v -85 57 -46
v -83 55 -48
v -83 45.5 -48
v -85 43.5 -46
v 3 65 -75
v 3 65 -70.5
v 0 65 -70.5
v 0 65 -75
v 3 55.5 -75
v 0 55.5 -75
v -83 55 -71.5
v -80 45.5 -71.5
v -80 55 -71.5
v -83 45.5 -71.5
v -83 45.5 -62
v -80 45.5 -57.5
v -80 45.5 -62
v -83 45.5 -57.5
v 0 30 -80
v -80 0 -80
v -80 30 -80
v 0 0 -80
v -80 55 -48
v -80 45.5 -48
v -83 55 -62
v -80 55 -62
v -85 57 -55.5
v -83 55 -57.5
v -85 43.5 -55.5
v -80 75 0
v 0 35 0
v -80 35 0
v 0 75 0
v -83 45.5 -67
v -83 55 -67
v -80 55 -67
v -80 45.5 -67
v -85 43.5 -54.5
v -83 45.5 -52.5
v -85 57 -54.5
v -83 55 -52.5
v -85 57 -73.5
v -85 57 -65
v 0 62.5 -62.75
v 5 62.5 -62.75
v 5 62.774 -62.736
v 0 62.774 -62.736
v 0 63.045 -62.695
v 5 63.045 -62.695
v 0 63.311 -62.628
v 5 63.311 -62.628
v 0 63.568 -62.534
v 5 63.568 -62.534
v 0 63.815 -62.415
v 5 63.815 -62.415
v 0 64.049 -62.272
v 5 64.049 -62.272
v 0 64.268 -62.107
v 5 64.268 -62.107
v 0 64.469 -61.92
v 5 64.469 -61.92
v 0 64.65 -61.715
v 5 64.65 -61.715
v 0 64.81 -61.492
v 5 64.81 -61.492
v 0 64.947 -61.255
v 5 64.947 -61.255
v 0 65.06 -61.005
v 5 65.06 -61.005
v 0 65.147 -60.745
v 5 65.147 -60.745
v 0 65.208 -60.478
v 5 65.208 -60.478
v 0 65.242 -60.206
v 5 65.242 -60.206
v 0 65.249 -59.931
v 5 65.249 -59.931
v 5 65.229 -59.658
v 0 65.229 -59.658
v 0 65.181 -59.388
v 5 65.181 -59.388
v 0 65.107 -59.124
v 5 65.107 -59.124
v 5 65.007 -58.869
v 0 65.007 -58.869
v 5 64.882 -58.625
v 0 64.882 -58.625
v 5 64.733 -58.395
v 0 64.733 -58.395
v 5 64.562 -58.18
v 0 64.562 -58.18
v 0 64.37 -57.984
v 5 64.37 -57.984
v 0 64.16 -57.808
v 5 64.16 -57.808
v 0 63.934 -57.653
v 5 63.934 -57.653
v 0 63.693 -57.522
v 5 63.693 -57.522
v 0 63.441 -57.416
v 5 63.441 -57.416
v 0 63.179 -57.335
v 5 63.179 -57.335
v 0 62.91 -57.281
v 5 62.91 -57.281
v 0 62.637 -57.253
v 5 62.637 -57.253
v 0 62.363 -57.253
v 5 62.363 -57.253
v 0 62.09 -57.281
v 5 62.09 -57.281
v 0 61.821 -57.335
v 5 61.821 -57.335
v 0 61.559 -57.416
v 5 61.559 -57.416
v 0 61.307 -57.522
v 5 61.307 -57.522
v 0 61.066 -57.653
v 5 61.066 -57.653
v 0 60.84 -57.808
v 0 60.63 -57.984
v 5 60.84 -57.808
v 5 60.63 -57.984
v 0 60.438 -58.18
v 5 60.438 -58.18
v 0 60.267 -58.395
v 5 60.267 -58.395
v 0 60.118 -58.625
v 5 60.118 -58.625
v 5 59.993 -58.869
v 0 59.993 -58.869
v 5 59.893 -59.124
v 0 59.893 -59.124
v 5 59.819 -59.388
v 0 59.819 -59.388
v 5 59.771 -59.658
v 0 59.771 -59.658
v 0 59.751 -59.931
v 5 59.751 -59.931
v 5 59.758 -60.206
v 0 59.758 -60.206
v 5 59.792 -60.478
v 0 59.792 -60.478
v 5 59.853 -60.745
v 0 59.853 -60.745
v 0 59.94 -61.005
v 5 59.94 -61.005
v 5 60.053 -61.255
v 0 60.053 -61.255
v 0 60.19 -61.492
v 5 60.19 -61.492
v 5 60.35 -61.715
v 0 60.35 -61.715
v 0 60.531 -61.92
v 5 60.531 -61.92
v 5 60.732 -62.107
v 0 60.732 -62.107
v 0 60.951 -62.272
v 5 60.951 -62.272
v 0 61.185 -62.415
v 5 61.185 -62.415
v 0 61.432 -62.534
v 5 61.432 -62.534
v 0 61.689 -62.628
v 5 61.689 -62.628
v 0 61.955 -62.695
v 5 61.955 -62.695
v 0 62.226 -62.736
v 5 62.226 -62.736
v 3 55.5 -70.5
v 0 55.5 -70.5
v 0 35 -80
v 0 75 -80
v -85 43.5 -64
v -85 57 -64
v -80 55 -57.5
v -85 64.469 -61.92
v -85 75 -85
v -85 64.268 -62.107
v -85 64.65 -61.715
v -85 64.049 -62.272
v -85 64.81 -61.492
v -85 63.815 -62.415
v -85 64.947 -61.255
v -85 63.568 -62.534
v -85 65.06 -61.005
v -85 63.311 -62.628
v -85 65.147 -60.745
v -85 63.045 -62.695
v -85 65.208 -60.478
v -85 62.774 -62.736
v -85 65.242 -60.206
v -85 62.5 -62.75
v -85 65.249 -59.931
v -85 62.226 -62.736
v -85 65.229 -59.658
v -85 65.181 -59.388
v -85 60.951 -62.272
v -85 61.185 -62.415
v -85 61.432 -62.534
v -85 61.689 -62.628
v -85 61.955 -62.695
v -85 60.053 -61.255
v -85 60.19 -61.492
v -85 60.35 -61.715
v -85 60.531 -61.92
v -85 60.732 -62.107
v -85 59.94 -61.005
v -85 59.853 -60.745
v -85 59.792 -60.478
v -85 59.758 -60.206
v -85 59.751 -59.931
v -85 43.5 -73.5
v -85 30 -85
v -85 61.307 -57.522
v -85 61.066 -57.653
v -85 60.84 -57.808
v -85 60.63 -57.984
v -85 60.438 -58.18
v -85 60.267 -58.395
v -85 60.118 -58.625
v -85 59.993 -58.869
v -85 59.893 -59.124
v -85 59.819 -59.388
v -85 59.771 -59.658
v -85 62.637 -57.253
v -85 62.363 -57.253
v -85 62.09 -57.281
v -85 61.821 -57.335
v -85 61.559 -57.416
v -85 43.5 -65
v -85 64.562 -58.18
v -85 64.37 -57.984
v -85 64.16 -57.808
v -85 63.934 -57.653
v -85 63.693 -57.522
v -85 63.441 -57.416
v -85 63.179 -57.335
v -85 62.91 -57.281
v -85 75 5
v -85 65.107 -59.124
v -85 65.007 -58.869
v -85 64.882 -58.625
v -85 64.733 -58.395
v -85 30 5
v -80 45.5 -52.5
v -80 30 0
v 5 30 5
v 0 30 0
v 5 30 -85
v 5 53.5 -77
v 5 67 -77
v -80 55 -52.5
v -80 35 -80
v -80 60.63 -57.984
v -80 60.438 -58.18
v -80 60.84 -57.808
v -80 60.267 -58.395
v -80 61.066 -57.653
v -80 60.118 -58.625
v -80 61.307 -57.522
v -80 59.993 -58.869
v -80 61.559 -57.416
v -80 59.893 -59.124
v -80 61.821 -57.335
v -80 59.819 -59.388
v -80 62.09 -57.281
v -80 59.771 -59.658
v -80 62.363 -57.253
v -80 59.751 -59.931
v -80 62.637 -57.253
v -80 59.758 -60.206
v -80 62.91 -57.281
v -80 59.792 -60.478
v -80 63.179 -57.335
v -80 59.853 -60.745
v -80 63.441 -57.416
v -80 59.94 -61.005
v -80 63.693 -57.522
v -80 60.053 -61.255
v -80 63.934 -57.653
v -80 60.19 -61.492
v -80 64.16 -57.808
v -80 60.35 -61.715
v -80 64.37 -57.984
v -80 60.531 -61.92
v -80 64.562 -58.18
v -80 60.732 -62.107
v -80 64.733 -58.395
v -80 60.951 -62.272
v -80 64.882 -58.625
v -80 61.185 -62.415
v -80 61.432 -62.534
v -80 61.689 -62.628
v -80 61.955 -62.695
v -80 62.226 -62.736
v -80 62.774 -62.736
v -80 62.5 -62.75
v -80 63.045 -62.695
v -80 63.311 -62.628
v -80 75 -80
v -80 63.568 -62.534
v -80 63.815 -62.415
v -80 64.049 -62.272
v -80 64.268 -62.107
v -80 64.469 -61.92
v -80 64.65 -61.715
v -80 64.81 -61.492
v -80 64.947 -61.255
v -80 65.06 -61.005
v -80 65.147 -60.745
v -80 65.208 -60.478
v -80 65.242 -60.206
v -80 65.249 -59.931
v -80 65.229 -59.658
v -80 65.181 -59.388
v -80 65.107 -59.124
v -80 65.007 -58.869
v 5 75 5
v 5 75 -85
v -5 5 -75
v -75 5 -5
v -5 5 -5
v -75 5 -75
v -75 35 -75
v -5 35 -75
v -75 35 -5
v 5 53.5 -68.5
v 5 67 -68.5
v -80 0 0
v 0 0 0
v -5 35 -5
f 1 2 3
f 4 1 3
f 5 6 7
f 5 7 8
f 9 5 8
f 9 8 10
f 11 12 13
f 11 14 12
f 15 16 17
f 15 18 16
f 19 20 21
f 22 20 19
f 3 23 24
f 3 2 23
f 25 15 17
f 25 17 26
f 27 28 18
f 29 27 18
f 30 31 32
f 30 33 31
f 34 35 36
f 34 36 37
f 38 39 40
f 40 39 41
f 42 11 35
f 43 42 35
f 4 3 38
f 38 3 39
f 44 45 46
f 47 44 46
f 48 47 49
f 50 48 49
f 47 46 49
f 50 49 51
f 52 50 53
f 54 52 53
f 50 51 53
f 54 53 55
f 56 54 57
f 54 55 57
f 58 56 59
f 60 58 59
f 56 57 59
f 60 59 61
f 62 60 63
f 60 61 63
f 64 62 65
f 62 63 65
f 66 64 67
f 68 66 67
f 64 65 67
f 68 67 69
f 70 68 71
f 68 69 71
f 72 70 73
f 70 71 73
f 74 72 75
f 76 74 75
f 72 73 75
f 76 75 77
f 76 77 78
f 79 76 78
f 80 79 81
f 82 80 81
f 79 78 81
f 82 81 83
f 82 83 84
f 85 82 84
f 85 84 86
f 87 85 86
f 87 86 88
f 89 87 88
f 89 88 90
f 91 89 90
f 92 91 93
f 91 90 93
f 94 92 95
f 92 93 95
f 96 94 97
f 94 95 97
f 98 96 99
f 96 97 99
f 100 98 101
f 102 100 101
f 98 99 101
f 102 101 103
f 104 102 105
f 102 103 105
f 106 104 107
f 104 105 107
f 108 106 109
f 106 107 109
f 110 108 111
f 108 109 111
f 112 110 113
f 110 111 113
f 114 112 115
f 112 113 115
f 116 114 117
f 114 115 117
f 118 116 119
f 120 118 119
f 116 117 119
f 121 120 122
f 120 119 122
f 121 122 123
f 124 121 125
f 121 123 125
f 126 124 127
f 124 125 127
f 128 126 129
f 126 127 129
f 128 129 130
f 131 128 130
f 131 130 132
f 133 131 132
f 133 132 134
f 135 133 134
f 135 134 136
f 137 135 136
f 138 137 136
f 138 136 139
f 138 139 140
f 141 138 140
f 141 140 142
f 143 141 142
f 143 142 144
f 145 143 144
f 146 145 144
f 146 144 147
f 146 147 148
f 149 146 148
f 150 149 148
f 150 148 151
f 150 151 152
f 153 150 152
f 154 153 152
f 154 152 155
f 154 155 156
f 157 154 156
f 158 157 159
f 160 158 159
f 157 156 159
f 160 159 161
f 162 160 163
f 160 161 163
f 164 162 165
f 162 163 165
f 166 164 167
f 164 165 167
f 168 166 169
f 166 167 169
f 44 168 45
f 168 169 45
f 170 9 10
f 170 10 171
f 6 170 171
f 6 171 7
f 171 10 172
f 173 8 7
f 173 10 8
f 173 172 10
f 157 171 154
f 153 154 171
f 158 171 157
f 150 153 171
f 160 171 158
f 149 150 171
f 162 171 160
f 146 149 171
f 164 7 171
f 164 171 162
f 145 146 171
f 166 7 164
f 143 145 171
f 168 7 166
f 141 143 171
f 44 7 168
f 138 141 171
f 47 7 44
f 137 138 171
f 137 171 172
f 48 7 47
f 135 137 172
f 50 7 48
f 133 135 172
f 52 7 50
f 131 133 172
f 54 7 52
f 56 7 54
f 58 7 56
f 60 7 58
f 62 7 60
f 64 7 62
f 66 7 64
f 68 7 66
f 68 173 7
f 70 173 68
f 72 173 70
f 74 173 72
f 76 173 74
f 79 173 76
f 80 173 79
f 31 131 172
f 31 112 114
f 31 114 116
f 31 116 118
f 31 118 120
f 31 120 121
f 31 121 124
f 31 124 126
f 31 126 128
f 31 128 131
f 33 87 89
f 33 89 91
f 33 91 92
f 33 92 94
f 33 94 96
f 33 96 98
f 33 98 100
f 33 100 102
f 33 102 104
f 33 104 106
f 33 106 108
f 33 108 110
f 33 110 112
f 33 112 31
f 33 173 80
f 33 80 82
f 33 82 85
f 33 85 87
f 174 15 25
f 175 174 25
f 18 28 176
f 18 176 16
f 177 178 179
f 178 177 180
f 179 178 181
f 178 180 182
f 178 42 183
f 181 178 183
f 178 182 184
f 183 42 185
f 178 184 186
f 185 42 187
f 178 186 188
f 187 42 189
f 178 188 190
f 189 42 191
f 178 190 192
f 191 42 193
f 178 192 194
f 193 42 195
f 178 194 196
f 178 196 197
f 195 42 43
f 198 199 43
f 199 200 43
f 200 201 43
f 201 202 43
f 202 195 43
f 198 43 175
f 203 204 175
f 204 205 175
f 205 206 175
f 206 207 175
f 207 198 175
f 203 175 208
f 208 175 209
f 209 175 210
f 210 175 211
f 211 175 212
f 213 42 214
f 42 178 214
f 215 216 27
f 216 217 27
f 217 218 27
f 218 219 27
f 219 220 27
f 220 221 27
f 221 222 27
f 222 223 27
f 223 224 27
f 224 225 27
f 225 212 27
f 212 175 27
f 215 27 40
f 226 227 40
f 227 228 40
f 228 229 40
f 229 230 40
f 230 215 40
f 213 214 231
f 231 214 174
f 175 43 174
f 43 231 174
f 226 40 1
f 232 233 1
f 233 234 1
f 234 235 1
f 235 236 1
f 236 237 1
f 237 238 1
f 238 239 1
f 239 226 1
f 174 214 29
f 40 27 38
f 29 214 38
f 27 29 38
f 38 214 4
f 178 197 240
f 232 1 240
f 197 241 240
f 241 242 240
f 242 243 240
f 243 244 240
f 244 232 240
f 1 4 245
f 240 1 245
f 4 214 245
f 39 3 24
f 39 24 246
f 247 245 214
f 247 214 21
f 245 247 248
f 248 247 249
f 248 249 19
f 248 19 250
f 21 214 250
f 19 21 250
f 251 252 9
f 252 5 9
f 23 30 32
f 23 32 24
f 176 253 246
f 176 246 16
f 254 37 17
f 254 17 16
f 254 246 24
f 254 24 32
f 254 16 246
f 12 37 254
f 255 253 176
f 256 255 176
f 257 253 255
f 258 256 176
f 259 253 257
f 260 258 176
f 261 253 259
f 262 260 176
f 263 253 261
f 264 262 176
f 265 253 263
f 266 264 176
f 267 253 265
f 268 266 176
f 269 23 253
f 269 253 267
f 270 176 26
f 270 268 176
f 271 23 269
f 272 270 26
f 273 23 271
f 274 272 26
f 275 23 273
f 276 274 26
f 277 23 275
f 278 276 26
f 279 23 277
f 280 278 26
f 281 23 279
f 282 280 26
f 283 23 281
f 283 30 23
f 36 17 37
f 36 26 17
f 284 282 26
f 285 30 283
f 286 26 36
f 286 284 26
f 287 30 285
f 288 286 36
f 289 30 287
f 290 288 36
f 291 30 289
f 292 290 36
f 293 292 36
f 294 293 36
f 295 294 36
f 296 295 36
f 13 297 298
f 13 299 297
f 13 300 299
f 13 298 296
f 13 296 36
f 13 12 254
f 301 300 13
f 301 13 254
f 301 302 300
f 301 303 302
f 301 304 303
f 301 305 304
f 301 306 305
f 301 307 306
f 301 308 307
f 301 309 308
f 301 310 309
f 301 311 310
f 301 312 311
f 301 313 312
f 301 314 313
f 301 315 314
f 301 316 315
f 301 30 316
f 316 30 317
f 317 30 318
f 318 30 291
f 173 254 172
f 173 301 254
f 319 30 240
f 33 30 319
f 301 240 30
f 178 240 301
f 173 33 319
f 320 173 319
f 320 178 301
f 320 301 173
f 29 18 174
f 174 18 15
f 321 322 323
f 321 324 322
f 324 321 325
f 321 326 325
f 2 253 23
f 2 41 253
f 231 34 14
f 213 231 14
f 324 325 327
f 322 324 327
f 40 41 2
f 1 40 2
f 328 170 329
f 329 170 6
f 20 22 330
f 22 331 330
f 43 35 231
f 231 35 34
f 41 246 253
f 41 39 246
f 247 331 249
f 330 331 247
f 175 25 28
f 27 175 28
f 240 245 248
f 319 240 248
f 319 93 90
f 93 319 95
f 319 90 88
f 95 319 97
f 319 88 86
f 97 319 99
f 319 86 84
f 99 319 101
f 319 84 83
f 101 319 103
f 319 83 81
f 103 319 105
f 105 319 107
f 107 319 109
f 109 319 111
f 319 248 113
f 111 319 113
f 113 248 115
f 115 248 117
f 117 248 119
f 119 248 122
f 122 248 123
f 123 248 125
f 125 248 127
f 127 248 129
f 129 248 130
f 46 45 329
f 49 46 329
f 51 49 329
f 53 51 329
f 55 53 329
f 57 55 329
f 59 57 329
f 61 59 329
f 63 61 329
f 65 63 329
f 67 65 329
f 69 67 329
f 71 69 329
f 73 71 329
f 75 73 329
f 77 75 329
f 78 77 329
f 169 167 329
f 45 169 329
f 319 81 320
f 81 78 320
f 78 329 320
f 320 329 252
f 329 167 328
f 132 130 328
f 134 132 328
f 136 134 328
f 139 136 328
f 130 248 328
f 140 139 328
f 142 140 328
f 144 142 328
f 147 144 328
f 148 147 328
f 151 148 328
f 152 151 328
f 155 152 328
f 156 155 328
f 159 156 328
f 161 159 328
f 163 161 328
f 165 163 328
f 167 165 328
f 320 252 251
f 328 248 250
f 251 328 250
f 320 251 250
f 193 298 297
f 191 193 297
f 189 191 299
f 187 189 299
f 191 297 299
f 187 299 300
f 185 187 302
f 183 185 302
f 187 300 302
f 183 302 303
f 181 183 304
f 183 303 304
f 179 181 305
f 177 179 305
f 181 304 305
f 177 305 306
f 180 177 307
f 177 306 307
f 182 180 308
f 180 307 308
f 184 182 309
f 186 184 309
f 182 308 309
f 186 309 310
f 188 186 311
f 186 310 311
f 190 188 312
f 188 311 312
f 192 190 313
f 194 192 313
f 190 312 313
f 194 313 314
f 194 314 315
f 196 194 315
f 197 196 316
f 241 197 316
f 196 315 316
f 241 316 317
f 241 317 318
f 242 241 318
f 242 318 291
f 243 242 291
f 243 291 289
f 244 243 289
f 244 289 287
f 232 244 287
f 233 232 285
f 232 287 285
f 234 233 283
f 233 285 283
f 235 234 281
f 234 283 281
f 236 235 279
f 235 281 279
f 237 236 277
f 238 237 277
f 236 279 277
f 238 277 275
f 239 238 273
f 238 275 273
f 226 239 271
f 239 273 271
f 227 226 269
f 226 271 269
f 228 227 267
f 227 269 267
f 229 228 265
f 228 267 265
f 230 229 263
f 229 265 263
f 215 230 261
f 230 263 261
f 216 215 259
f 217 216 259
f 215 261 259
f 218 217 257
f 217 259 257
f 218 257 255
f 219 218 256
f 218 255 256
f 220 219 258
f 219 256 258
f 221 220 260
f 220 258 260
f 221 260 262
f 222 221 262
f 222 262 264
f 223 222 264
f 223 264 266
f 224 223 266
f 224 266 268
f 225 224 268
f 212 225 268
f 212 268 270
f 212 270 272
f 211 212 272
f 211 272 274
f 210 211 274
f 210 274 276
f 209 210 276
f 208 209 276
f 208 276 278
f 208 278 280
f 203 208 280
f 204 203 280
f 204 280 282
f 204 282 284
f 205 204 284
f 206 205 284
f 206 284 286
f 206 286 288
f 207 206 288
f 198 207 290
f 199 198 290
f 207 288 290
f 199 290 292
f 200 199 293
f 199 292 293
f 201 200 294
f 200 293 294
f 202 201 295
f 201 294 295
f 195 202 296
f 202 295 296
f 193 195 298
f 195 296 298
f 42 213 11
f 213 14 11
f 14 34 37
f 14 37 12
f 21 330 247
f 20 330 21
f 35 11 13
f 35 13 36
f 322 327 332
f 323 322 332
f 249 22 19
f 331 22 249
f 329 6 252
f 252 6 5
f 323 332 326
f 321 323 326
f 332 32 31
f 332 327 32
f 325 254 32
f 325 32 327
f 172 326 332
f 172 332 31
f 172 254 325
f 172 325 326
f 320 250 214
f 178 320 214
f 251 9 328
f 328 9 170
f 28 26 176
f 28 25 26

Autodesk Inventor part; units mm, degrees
ref_plane "YZ Plane" through (0, 0, 0) normal (1, 0, 0) x (0, 1, 0)
ref_plane "XZ Plane" through (0, 0, 0) normal (0, 1, 0) x (-1, 0, 0)
ref_plane "XY Plane" through (0, 0, 0) normal (0, 0, 1) x (1, 0, 0)
sketch "Sketch1" plane through (0, 0, 0) normal (0, 1, 0) x (-1, 0, 0)
  line L0 (0, 0) -> (80, 0)
  line L1 (80, 0) -> (80, -80)
  line L2 (80, -80) -> (0, -80)
  line L3 (0, -80) -> (0, 0)
  dimension "d0" = 80
  dimension "d1" = 80
extrude "Extrusion1" add sketch "Sketch1" along normal blind 30
sketch "Sketch2" plane through (0, 30, 0) normal (0, 1, 0) x (1, 0, 0)
  line L0 (-85, -5) -> (5, -5)
  line L1 (5, -5) -> (5, 85)
  line L2 (5, 85) -> (-85, 85)
  line L3 (-85, 85) -> (-85, -5)
  line L4 (-80, 80) -> (-80, 0) projected
  line L5 (0, 80) -> (-80, 80) projected
  line L6 (-80, 0) -> (0, 0) projected
  line L7 (0, 0) -> (0, 80) projected
  dimension "d4" = 5
  dimension "d5" = 5
  dimension "d6" = 5
  dimension "d7" = 5
extrude "Extrusion2" add sketch "Sketch2" along normal blind 45 contours L3 L2 L1 L0 | L5 L7 L6 L4
sketch "Sketch3" plane through (0, 75, 0) normal (0, 1, 0) x (1, 0, 0)
  line L0 (0, 0) -> (-80, 0)
  line L1 (-80, 0) -> (-80, 80)
  line L2 (-80, 80) -> (0, 80)
  line L3 (0, 80) -> (0, 0)
  line L4 (-85, 85) -> (-85, -5) projected
  line L5 (5, 85) -> (-85, 85) projected
  dimension "d10" = 5
  dimension "d11" = 5
extrude "Extrusion3" cut sketch "Sketch3" against normal blind 40
sketch "Sketch4" plane through (0, 35, 0) normal (0, 1, 0) x (1, 0, 0)
  line L0 (-75, 5) -> (-5, 5)
  line L1 (-5, 5) -> (-5, 75)
  line L2 (-5, 75) -> (-75, 75)
  line L3 (-75, 75) -> (-75, 5)
  line L4 (-80, 80) -> (0, 80) projected
  line L5 (0, 80) -> (0, 0) projected
  line L6 (0, 0) -> (-80, 0) projected
  line L7 (-80, 0) -> (-80, 80) projected
  dimension "d14" = 5
  dimension "d15" = 5
  dimension "d16" = 5
  dimension "d17" = 5
extrude "Extrusion4" cut sketch "Sketch4" against normal blind 30 contours L3 L2 L1 L0
sketch "Sketch5" plane through (5, 30, 5) normal (1, 0, 0) x (0, 0, -1)
  circle A0 centre (65, 32.5) radius 2.75
  line L0 (0, 45) -> (90, 45) projected
  line L1 (90, 0) -> (90, 45) projected
  point P0 (5, -30)
  dimension "d20" = 5.5
  dimension "d21" = 12.5
  dimension "d22" = 25
extrude "Extrusion5" cut sketch "Sketch5" against normal through all
sketch "Sketch6" plane through (5, 30, 5) normal (1, 0, 0) x (0, 0, -1)
  line L0 (75.5, 35) -> (80, 35)
  line L1 (80, 35) -> (80, 25.5)
  line L2 (80, 25.5) -> (75.5, 25.5)
  line L3 (75.5, 25.5) -> (75.5, 35)
  line L4 (90, 0) -> (90, 45) projected
  line L5 (0, 45) -> (90, 45) projected
  point P0 (5, -30)
  dimension "d25" = 10
  dimension "d26" = 4.5
  dimension "d27" = 9.5
  dimension "d28" = 10
extrude "Extrusion6" cut sketch "Sketch6" against normal blind 10
chamfer "Chamfer1" distance 2 angle 45 4 edges at (5, 60.25, -70.5) (5, 65, -72.75) (5, 60.25, -75) (5, 55.5, -72.75)
sketch "Sketch8" plane through (-85, 30, -85) normal (-1, 0, 0) x (0, 0, 1)
  line L0 (23, 25) -> (27.5, 25)
  line L1 (27.5, 25) -> (27.5, 15.5)
  line L2 (27.5, 15.5) -> (23, 15.5)
  line L3 (23, 15.5) -> (23, 25)
  line L4 (13.5, 25) -> (18, 25)
  line L5 (18, 25) -> (18, 15.5)
  line L6 (18, 15.5) -> (13.5, 15.5)
  line L7 (13.5, 15.5) -> (13.5, 25)
  line L8 (32.5, 25) -> (37, 25)
  line L9 (37, 25) -> (37, 15.5)
  line L10 (37, 15.5) -> (32.5, 15.5)
  line L11 (32.5, 15.5) -> (32.5, 25)
  line L12 (0, 45) -> (90, 45) projected
  line L13 (0, 0) -> (0, 45) projected
  point P0 (85, -30)
  dimension "d39" = 4.5
  dimension "d40" = 9.5
  dimension "d41" = 4.5
  dimension "d42" = 4.5
  dimension "d43" = 20
  dimension "d44" = 23
  dimension "d45" = 5
  dimension "d46" = 5
extrude "Extrusion7" cut sketch "Sketch8" against normal blind 10
chamfer "Chamfer2" distance 2 angle 45 12 edges at (-85, 55, -69.25) (-85, 50.25, -71.5) (-85, 50.25, -67) (-85, 45.5, -69.25) (-85, 50.25, -62) (-85, 55, -59.75) (-85, 50.25, -57.5) (-85, 45.5, -59.75) (-85, 50.25, -52.5) (-85, 55, -50.25) (-85, 50.25, -48) (-85, 45.5, -50.25)
properties part number "BlackBoxBottomFall2019"
